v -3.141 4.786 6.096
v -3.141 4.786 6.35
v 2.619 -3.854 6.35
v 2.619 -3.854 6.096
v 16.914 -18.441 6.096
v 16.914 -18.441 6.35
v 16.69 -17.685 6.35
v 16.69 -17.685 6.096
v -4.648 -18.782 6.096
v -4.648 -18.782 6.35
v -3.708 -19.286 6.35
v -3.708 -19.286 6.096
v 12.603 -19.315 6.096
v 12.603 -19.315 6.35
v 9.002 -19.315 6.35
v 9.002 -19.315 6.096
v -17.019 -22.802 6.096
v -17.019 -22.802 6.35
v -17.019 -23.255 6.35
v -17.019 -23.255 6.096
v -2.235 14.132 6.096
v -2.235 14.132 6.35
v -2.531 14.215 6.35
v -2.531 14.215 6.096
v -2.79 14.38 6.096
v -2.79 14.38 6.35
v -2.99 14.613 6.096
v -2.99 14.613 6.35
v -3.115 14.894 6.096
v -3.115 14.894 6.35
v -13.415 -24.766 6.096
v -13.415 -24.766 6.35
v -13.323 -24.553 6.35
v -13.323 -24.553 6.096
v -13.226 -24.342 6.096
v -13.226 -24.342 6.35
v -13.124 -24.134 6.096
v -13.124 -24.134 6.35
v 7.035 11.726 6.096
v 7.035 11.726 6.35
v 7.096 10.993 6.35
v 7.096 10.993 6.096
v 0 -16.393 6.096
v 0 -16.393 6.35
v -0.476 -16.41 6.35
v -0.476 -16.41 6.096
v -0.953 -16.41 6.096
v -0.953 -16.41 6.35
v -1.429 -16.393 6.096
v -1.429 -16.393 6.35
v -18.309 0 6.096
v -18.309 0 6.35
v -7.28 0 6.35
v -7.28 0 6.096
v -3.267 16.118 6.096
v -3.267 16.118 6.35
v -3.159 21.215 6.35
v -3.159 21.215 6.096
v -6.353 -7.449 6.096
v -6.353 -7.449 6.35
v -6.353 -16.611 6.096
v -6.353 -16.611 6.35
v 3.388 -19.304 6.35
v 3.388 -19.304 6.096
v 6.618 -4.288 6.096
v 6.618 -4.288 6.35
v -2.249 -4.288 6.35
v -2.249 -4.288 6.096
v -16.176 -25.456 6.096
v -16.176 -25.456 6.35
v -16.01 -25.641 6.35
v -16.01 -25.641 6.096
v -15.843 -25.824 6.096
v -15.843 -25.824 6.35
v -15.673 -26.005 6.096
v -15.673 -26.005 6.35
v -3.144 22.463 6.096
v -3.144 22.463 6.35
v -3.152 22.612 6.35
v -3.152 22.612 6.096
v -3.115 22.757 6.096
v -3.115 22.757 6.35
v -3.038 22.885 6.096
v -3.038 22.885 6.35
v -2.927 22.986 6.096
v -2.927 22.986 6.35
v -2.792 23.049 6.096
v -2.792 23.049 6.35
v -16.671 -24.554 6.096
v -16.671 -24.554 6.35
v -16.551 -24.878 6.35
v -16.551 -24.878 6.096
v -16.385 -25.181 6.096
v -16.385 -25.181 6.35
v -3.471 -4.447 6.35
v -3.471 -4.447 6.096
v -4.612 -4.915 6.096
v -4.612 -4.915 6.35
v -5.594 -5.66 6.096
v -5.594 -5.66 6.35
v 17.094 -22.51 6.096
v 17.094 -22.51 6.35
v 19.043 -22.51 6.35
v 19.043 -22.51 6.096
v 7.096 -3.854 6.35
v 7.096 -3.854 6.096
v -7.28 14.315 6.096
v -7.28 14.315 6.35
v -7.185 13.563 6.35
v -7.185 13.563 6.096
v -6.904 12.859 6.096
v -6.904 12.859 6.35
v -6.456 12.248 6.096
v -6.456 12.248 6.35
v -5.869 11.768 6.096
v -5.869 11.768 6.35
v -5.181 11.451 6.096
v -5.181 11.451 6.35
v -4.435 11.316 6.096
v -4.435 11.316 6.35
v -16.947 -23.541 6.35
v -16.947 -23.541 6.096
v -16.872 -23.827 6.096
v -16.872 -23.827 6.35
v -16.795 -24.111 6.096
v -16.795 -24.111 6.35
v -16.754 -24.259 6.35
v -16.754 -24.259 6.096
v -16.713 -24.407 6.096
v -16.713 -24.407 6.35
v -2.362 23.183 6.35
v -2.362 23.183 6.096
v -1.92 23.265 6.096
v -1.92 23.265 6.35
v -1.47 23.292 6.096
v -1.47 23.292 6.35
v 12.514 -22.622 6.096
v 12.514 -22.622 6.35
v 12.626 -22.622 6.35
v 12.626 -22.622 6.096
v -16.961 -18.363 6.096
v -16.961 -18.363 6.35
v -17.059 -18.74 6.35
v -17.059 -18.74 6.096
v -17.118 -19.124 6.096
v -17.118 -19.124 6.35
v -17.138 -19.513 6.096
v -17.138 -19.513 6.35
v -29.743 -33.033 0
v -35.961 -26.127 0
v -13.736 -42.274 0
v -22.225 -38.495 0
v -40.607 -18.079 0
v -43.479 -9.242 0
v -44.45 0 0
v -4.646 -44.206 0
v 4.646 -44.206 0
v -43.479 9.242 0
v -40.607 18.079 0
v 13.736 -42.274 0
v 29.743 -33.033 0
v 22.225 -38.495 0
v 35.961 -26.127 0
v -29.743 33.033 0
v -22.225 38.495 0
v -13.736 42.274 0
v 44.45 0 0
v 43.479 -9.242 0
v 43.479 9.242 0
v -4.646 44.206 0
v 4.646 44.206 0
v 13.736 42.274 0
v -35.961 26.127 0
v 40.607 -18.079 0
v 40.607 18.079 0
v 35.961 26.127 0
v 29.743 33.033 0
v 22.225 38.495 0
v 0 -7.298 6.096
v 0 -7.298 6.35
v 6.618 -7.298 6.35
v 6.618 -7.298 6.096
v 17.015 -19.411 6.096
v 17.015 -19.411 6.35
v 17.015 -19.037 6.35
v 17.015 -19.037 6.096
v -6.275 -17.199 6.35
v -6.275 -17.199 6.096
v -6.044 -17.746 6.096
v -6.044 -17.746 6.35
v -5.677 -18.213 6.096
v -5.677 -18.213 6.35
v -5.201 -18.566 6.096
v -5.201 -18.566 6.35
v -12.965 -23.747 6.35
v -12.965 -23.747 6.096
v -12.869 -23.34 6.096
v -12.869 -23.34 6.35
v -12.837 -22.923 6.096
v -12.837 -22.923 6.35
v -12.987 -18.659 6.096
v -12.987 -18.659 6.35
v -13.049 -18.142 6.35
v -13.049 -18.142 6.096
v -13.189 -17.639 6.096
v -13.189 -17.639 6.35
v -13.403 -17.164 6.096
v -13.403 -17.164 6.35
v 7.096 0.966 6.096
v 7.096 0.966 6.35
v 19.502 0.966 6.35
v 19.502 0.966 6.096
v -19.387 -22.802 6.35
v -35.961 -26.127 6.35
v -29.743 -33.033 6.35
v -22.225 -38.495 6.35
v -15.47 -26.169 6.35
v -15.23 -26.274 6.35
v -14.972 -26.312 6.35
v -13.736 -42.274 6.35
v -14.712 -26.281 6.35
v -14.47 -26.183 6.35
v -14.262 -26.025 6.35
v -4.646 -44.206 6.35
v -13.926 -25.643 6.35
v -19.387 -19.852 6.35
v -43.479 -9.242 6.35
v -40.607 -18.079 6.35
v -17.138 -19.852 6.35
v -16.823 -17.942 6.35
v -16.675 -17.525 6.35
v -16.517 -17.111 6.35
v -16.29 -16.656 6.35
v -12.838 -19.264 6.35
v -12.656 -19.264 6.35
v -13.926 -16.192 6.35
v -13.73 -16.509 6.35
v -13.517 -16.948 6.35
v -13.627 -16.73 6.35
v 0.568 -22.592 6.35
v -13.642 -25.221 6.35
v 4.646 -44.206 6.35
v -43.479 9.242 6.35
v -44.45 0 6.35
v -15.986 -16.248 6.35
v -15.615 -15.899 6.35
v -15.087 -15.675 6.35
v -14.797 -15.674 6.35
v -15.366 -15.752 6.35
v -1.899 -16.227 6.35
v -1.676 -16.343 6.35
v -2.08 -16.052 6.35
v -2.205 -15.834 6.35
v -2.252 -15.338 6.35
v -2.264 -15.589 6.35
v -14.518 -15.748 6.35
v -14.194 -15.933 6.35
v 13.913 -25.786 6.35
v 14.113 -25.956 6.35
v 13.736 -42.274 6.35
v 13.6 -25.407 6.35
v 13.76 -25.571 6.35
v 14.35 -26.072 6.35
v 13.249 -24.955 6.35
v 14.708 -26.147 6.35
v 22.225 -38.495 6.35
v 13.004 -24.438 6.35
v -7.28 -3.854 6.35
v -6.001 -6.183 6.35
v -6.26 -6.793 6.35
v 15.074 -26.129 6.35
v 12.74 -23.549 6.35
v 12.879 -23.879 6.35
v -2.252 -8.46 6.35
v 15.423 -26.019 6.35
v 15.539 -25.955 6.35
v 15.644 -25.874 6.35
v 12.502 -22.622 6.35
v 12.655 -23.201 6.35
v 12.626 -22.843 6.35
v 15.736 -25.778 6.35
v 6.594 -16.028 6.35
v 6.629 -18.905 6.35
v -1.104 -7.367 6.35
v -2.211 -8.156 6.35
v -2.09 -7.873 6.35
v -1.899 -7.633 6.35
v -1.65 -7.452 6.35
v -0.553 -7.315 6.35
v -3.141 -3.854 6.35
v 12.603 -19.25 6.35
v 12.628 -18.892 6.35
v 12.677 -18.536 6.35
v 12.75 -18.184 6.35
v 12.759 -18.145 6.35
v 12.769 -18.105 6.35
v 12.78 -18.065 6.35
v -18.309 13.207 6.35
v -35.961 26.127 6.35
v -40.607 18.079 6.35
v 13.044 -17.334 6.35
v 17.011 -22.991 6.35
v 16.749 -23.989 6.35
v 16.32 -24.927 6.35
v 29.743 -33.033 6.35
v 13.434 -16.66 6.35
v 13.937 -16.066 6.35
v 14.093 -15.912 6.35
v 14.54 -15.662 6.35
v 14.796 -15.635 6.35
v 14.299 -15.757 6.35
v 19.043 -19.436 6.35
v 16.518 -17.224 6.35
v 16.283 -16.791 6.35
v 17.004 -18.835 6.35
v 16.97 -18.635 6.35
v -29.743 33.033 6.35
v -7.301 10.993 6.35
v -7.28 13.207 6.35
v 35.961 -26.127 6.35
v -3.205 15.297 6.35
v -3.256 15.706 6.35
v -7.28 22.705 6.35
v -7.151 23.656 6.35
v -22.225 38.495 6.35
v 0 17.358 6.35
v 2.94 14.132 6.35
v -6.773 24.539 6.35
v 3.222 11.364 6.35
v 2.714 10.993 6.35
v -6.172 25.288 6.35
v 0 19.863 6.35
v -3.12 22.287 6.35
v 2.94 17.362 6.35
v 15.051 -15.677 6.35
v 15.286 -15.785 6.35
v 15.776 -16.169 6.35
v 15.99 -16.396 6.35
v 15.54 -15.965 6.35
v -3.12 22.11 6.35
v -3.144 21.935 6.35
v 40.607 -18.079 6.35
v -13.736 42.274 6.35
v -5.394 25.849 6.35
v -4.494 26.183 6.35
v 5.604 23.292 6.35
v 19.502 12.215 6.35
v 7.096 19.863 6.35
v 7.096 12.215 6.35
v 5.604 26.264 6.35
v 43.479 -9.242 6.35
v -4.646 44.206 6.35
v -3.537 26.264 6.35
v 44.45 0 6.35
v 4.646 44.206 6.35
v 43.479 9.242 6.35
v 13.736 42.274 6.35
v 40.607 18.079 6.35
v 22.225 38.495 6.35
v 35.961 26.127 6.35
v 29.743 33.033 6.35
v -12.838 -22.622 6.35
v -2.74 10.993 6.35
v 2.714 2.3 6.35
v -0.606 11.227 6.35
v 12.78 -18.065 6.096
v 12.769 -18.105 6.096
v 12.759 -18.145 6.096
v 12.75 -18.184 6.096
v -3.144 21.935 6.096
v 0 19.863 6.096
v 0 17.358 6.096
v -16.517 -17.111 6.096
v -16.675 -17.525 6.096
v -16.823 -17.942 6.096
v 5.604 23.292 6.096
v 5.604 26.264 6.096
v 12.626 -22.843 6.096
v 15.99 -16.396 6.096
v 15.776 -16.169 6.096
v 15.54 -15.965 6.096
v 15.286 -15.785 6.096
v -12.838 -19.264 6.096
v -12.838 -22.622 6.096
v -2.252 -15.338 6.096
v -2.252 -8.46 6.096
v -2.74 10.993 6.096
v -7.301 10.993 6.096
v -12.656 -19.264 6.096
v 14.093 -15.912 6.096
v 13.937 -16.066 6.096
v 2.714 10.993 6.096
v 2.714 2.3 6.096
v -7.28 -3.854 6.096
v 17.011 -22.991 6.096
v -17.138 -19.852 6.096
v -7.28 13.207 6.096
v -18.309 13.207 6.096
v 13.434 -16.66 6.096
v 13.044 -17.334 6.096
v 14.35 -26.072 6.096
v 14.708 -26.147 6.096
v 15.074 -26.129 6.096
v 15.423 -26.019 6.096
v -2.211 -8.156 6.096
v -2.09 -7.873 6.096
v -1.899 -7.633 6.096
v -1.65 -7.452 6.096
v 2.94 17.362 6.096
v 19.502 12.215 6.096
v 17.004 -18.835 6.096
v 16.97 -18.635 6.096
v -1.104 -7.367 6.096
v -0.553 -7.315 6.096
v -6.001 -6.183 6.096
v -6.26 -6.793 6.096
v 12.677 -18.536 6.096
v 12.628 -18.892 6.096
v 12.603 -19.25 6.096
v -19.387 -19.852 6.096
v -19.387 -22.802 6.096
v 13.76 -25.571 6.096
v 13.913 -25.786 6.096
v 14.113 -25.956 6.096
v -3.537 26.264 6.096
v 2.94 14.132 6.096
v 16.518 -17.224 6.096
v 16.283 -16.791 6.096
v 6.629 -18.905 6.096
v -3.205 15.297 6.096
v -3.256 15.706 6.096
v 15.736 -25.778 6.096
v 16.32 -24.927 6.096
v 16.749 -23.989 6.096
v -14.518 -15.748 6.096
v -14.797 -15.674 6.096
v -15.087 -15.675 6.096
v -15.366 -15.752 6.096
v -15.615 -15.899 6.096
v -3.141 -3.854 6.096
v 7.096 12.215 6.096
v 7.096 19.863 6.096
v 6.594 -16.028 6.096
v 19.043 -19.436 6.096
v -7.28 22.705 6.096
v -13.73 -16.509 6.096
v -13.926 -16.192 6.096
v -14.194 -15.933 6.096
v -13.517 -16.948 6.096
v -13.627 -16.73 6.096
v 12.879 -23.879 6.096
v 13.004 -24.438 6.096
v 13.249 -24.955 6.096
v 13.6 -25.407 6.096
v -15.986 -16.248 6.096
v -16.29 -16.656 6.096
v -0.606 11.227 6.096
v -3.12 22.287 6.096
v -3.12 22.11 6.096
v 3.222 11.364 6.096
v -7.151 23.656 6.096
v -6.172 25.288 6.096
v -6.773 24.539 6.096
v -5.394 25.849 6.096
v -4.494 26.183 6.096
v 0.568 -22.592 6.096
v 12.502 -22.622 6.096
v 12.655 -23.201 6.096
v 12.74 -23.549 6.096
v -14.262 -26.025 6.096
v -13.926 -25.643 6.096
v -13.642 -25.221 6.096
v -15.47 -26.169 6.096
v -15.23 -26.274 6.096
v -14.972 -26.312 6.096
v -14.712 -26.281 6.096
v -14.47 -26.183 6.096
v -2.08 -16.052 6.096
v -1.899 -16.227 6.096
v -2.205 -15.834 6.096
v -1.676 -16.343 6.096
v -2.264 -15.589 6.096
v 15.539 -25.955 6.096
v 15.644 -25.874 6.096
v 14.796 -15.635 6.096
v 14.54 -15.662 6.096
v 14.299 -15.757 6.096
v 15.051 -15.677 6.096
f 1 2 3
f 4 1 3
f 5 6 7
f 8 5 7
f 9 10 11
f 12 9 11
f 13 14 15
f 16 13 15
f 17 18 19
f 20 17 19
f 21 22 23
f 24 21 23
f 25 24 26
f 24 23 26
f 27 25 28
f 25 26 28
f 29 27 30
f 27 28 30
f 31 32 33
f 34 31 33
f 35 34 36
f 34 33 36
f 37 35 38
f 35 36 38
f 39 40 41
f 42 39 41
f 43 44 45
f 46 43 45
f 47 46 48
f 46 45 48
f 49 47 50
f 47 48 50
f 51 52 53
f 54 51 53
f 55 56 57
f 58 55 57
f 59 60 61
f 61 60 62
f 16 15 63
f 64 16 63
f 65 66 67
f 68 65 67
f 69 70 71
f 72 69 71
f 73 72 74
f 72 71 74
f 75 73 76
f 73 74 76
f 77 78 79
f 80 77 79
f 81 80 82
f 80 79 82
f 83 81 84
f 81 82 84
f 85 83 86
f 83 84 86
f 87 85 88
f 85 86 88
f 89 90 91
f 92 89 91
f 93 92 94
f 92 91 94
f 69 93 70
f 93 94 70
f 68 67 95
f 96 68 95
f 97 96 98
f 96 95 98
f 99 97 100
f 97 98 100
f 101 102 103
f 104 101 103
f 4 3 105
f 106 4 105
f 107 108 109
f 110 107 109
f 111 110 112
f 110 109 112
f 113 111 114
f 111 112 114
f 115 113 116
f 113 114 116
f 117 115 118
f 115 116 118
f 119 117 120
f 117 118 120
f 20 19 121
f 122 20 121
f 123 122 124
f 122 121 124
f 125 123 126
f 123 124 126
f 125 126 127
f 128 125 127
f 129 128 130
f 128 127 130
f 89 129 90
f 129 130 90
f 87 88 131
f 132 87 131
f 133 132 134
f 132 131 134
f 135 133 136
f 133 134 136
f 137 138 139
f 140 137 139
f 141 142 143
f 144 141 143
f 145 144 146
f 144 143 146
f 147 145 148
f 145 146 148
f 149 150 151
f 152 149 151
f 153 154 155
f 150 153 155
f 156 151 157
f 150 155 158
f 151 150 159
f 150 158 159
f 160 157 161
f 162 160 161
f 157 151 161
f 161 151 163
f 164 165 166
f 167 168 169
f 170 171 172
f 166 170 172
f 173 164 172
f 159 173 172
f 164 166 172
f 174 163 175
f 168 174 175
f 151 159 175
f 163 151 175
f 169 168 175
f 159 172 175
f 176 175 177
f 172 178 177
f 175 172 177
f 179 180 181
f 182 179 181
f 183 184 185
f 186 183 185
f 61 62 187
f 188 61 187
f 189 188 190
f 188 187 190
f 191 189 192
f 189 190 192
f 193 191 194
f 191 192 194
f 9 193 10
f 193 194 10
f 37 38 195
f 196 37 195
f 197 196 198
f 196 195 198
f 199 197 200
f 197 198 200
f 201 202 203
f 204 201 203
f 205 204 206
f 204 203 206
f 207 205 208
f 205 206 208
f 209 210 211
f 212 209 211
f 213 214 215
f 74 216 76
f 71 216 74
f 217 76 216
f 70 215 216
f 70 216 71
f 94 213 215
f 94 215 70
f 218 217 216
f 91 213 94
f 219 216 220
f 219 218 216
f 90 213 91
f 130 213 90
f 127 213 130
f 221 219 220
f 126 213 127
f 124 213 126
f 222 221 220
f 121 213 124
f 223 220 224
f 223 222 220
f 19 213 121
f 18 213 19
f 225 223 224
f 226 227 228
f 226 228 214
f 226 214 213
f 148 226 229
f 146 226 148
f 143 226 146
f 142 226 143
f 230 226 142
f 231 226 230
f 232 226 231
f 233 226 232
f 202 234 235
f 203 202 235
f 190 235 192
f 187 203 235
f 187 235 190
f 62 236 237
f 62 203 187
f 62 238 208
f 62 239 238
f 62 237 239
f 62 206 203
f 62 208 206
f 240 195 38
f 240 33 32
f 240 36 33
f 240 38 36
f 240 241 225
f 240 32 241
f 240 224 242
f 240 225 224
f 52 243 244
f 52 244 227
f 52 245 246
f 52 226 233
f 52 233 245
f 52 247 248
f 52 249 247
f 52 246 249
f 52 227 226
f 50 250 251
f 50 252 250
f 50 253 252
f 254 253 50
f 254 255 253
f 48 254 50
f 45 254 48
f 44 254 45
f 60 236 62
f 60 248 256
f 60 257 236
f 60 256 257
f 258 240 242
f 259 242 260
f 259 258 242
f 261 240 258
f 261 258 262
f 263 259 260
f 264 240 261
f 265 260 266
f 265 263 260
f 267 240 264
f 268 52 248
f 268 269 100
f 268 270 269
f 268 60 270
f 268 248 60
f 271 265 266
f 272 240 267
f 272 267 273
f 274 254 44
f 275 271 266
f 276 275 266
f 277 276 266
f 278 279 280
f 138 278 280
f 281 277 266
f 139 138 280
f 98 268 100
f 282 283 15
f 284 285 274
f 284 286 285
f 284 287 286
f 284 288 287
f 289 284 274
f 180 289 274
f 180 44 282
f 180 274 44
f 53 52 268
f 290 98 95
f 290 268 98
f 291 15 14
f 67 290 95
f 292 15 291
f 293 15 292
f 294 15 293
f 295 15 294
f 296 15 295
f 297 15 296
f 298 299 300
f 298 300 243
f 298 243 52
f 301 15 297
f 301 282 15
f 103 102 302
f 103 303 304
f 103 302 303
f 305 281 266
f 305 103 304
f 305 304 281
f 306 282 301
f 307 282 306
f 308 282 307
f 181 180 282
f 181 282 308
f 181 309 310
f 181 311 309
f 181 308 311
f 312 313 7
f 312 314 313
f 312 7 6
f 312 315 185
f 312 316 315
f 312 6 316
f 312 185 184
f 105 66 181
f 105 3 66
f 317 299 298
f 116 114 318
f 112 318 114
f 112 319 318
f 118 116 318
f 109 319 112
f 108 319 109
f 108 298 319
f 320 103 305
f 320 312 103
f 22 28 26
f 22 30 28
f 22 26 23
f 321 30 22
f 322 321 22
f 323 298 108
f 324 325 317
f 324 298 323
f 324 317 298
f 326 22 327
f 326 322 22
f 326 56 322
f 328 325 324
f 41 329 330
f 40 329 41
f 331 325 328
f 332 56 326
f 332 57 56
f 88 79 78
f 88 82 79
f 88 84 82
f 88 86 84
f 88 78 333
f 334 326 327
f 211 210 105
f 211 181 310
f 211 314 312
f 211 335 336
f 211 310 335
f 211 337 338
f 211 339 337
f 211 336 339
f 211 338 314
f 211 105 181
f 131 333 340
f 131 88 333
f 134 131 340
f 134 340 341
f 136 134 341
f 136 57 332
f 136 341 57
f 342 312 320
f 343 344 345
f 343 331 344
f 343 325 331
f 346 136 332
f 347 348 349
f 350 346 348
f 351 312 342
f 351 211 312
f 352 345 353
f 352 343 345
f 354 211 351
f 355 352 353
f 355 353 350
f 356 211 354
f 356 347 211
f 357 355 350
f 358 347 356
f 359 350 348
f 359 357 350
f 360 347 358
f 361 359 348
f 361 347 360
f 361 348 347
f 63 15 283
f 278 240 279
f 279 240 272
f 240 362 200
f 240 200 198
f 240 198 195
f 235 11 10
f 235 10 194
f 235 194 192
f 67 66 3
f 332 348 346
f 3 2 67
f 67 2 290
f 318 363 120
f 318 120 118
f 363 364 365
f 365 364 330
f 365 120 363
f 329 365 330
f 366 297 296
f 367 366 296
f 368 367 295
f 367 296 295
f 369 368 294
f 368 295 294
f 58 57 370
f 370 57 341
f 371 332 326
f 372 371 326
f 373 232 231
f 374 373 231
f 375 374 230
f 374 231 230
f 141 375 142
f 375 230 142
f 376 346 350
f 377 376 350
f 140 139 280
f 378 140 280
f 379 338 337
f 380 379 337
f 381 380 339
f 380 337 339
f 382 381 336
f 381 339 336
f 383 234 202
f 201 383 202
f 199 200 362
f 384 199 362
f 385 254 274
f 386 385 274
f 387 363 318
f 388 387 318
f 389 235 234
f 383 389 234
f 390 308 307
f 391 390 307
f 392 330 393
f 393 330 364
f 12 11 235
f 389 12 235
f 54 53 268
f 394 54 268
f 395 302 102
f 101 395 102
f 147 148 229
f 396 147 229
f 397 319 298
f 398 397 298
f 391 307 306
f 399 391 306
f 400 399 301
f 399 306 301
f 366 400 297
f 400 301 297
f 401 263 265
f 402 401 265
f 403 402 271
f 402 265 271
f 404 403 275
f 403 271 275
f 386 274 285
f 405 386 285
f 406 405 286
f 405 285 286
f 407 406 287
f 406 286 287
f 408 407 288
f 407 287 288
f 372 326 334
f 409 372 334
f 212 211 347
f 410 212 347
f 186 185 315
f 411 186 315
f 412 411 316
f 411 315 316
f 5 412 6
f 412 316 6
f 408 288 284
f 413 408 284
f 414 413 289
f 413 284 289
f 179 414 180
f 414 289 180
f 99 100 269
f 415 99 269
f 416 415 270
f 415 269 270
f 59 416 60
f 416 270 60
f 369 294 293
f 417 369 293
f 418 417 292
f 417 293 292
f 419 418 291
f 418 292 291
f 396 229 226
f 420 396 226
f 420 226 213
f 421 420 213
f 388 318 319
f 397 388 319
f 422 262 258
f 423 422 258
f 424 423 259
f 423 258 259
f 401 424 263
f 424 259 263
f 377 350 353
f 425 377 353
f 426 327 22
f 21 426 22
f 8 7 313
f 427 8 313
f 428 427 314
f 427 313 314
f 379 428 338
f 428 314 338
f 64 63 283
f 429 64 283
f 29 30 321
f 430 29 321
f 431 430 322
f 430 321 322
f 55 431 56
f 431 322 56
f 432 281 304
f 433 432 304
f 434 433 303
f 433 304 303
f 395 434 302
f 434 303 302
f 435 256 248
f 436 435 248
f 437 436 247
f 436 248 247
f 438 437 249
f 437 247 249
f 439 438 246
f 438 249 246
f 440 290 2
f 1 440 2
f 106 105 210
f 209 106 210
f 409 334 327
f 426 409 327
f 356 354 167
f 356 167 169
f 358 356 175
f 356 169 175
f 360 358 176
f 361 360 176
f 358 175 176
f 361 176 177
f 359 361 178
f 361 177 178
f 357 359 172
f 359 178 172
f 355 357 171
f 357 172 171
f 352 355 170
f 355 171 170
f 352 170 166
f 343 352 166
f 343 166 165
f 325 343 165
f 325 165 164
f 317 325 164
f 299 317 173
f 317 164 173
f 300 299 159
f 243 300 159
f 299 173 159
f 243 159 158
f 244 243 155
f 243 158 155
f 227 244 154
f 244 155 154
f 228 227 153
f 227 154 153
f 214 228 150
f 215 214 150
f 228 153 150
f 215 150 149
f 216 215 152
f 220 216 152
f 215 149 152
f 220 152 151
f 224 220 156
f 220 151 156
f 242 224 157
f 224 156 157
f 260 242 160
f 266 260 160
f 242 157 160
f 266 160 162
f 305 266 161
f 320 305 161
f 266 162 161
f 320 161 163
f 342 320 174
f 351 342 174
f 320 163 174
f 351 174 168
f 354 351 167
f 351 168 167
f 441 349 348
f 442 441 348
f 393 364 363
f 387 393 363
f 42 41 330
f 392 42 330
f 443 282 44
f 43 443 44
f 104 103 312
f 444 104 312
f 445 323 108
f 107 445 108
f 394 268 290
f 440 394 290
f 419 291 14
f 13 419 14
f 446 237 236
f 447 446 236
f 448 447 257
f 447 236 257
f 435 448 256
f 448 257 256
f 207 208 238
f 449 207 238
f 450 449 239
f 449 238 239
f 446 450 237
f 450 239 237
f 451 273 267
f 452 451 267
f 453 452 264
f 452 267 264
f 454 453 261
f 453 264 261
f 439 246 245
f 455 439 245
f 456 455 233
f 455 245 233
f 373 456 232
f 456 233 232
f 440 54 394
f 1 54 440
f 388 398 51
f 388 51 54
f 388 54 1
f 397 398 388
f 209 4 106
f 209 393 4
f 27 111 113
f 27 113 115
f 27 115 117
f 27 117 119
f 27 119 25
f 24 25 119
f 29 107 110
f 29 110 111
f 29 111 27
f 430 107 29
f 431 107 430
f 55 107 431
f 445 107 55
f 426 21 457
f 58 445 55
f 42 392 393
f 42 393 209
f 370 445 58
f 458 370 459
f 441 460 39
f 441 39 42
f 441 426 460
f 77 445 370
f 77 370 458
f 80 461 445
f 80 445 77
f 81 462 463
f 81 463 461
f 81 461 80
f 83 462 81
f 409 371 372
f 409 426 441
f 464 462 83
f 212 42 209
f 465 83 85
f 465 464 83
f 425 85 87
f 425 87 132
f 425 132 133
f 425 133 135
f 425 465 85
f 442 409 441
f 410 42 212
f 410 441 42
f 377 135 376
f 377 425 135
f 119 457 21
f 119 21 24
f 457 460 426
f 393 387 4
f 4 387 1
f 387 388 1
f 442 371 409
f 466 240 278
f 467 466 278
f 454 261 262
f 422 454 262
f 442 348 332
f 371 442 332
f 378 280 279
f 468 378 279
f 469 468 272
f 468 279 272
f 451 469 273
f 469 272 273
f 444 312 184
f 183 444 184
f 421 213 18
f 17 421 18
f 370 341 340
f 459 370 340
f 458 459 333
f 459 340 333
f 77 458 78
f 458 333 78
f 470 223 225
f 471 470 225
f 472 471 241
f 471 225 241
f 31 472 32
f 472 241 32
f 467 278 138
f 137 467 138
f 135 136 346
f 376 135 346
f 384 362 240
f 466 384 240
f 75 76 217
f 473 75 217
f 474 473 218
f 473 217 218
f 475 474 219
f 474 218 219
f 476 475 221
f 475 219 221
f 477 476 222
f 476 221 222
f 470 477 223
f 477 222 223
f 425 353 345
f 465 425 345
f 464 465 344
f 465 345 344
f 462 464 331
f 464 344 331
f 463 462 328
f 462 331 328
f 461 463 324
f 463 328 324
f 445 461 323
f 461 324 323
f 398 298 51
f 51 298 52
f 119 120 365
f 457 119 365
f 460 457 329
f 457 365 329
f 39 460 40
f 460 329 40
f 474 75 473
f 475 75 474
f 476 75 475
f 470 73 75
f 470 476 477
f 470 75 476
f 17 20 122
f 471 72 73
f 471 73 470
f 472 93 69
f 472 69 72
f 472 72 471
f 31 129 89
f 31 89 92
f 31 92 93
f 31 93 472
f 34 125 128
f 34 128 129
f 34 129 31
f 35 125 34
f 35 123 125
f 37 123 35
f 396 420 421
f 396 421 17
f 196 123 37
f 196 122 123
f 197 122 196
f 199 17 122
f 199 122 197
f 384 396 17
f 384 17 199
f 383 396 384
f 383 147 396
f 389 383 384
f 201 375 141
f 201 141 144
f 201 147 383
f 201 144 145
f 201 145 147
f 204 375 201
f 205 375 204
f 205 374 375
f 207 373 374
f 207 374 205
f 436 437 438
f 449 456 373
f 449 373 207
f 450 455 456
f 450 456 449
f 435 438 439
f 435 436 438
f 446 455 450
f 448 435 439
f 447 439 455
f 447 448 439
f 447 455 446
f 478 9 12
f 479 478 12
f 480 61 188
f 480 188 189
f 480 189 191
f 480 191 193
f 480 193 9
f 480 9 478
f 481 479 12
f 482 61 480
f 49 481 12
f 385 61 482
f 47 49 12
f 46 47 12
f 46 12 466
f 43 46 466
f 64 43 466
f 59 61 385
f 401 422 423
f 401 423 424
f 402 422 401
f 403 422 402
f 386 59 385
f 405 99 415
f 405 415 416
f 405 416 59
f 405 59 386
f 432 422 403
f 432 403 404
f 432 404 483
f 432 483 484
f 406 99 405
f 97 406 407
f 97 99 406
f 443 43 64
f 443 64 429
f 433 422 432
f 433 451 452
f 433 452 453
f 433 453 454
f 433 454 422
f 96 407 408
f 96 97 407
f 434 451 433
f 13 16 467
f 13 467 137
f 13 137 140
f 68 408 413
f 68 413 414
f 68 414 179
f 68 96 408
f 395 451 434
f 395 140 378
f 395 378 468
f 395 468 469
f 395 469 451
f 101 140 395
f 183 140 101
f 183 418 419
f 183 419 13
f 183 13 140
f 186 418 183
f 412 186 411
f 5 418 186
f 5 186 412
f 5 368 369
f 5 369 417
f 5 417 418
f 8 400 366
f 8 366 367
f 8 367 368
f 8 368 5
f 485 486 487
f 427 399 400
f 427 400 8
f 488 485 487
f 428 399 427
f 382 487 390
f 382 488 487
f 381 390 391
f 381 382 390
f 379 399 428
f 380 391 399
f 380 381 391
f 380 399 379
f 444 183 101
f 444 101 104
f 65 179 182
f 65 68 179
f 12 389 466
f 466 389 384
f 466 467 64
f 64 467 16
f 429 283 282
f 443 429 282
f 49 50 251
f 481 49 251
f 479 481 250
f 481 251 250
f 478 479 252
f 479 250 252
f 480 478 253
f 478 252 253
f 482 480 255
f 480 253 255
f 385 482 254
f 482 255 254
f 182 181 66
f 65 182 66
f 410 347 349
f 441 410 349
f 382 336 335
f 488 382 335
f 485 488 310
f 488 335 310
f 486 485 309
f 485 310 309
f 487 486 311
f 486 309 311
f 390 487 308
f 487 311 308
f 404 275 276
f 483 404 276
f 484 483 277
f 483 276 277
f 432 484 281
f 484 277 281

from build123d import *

# Parameters (mm, degrees)
F0_R     = 44.45
F1_DEPTH = 6.35
F3_DEPTH = 0.254


# Not quite as in the source:
# - ends of sketch curves that miss each other by under 0.0002 mm in the source are joined


with BuildPart() as f1:
    # F0 (on Top) → F1 (new body)
    with BuildSketch(Plane.XY):
        Circle(F0_R)
    extrude(amount=F1_DEPTH)

    # F2 (on face) → F3 (cut)
    with BuildSketch(Plane.XY.offset(6.35)):
        with BuildLine():
            Line((5.6039993651, 23.2917912652), (5.6039993651, 26.2641511811))
            Line((5.6039993651, 26.2641511811), (-3.5374157604, 26.2641511811))
            ThreePointArc((-3.5374157604, 26.2641511811), (-6.1724008767, 25.2877017598), (-7.2804156008, 22.7052797559))
            Line((-7.2804156008, 22.7052797559), (-7.2804156008, 14.3152289093))
            ThreePointArc((-7.2804156008, 14.3152289093), (-6.4557803762, 12.2478717336), (-4.4346582144, 11.3156409934))
            ThreePointArc((-4.4346582144, 11.3156409934), (1.3092272973, 11.2673019991), (7.0349466987, 11.7263169959))
            Line((7.0349466987, 11.7263169959), (7.0961336605, 12.2146336362))
            Line((7.0961336605, 12.2146336362), (7.0961336605, 19.8627323627))
            Line((7.0961336605, 19.8627323627), (0, 19.8627323627))
            Line((0, 19.8627323627), (0, 17.358450219))
            Line((0, 17.358450219), (2.9400843196, 17.3616167158))
            Line((2.9400843196, 17.3616167158), (2.9400843196, 14.1317071393))
            Line((2.9400843196, 14.1317071393), (0, 14.1317071393))
            Line((0, 14.1317071393), (-2.2346060723, 14.1317071393))
            ThreePointArc((-2.2346060723, 14.1317071393), (-2.7898678793, 14.3800667532), (-3.1146267429, 14.8943914101))
            ThreePointArc((-3.1146267429, 14.8943914101), (-3.2355914853, 15.5005322545), (-3.2674165577, 16.1178055789))
            Line((-3.2674165577, 16.1178055789), (-3.1592417437, 21.2145812126))
            ThreePointArc((-3.1592417437, 21.2145812126), (-3.1837866635, 21.575252567), (-3.1439608429, 21.9345577061))
            ThreePointArc((-3.1439608429, 21.9345577061), (-3.117530452, 22.198564373), (-3.1439608429, 22.4625710398))
            ThreePointArc((-3.1439608429, 22.4625710398), (-3.0817290753, 22.8241742068), (-2.7919525746, 23.0492502451))
            ThreePointArc((-2.7919525746, 23.0492502451), (-2.1422008965, 23.2306538656), (-1.4703774561, 23.2917912652))
            Line((-1.4703774561, 23.2917912652), (5.6039993651, 23.2917912652))
        make_face()
        with BuildLine():
            Line((-3.1592417437, 21.2145812126), (-3.1439608429, 21.9345577061))
            ThreePointArc((-3.1439608429, 21.9345577061), (-3.1837866635, 21.575252567), (-3.1592417437, 21.2145812126))
        make_face()
        Polygon((7.0961336605, 12.2146336362), (7.0349466987, 11.7263169959), (7.0961336605, 10.9925279394), (7.0961336605, 0.9659290663), (19.5016358048, 0.9659290663), (19.5016358048, 12.2146336362), align=None)
        Polygon((7.0961336605, 0.9659290663), (7.0961336605, 10.9925279394), (2.7143813204, 10.9925279394), (2.7143813204, 2.2997791572), (-2.7398910557, 10.9925279394), (-7.300500758, 10.9925279394), (-7.2804156008, 0), (-7.2804156008, -3.8537723012), (-6.2781353481, -3.8537723012), (-3.1410043308, -3.8537723012), (-3.1410043308, 4.7863919603), (2.6191033489, -3.8537723012), (7.0961336605, -3.8537723012), align=None)
        Polygon((-7.2804156008, 0), (-7.300500758, 10.9925279394), (-7.2804156008, 13.206558302), (-18.3086954057, 13.206558302), (-18.3086954057, 0), align=None)
        with BuildLine():
            Line((0, -7.2983574902), (6.6179535352, -7.2983574902))
            Line((6.6179535352, -7.2983574902), (6.6179535352, -4.2878086955))
            Line((6.6179535352, -4.2878086955), (-2.2489061664, -4.2878086955))
            ThreePointArc((-2.2489061664, -4.2878086955), (-4.0568875501, -4.6442817118), (-5.5942512015, -5.6603440615))
            ThreePointArc((-5.5942512015, -5.6603440615), (-6.1507192567, -6.4794007942), (-6.3533238135, -7.4486592847))
            Line((-6.3533238135, -7.4486592847), (-6.3533238135, -16.6105034737))
            ThreePointArc((-6.3533238135, -16.6105034737), (-5.8759308245, -17.9913268961), (-4.6476325952, -18.782440573))
            Line((-4.6476325952, -18.782440573), (-3.7075637703, -19.2863568686))
            Line((-3.7075637703, -19.2863568686), (3.3881619917, -19.303988614))
            Line((3.3881619917, -19.303988614), (6.6293859856, -18.9052186906))
            Line((6.6293859856, -18.9052186906), (6.593650474, -16.0276701207))
            Line((6.593650474, -16.0276701207), (0, -16.3928680122))
            ThreePointArc((0, -16.3928680122), (-0.7145080017, -16.4126398372), (-1.4290160034, -16.3928680122))
            ThreePointArc((-1.4290160034, -16.3928680122), (-2.080113152, -16.0523673946), (-2.251843689, -15.3379607946))
            Line((-2.251843689, -15.3379607946), (-2.251843689, -8.4599647671))
            ThreePointArc((-2.251843689, -8.4599647671), (-2.0899663646, -7.8730095416), (-1.6501033679, -7.4520092458))
            ThreePointArc((-1.6501033679, -7.4520092458), (-0.8286208401, -7.3368533365), (0, -7.2983574902))
        make_face()
        with BuildLine():
            Line((3.3881619917, -19.303988614), (-3.7075637703, -19.2863568686))
            Line((-3.7075637703, -19.2863568686), (-12.6563319936, -19.2641206086))
            Line((-12.6563319936, -19.2641206086), (-12.8377182409, -19.2641206086))
            Line((-12.8377182409, -19.2641206086), (-12.9873463884, -18.6591409147))
            ThreePointArc((-12.9873463884, -18.6591409147), (-13.1098010784, -17.8878071535), (-13.4031539783, -17.1640012413))
            ThreePointArc((-13.4031539783, -17.1640012413), (-13.5725884432, -16.8395453931), (-13.7304924428, -16.5093243122))
            ThreePointArc((-13.7304924428, -16.5093243122), (-14.0521811274, -16.0543913958), (-14.5178735256, -15.7484859228))
            ThreePointArc((-14.5178735256, -15.7484859228), (-15.086809482, -15.6747136098), (-15.6148988754, -15.8988833427))
            ThreePointArc((-15.6148988754, -15.8988833427), (-16.1466107031, -16.4449553577), (-16.5172908455, -17.1109195799))
            ThreePointArc((-16.5172908455, -17.1109195799), (-16.7501696159, -17.7330376736), (-16.9609729201, -18.3629784733))
            ThreePointArc((-16.9609729201, -18.3629784733), (-17.0934179213, -18.9312665088), (-17.1379111707, -19.5130854845))
            Line((-17.1379111707, -19.5130854845), (-17.1379111707, -19.8522191495))
            Line((-17.1379111707, -19.8522191495), (-19.3871874362, -19.8522191495))
            Line((-19.3871874362, -19.8522191495), (-19.3871874362, -22.8021256626))
            Line((-19.3871874362, -22.8021256626), (-17.0194374538, -22.8021256626))
            Line((-17.0194374538, -22.8021256626), (-17.0194374538, -23.2551640704))
            ThreePointArc((-17.0194374538, -23.2551640704), (-16.9093551317, -23.6838787474), (-16.7950224131, -24.1114795208))
            ThreePointArc((-16.7950224131, -24.1114795208), (-16.7338426372, -24.3328635786), (-16.6711639613, -24.5538279414))
            ThreePointArc((-16.6711639613, -24.5538279414), (-16.4738073507, -25.0326716474), (-16.1757338792, -25.4562199116))
            ThreePointArc((-16.1757338792, -25.4562199116), (-15.9267297619, -25.732701627), (-15.6729177634, -26.0047763574))
            ThreePointArc((-15.6729177634, -26.0047763574), (-14.9718242273, -26.3117655956), (-14.2623546636, -26.0246637372))
            ThreePointArc((-14.2623546636, -26.0246637372), (-13.7772653209, -25.4368959002), (-13.4154763073, -24.7661564499))
            ThreePointArc((-13.4154763073, -24.7661564499), (-13.2751868701, -24.4473909933), (-13.1237693131, -24.1337586194))
            ThreePointArc((-13.1237693131, -24.1337586194), (-12.9090296801, -23.5454392253), (-12.837051295, -22.9233042467))
            Line((-12.837051295, -22.9233042467), (-12.8377182409, -22.622095421))
            Line((-12.8377182409, -22.622095421), (0.5678676759, -22.592412358))
            Line((0.5678676759, -22.592412358), (12.5019904939, -22.6220667474))
            Line((12.5019904939, -22.6220667474), (12.5135298725, -22.622095421))
            Line((12.5135298725, -22.622095421), (12.6259239413, -22.622095421))
            Line((12.6259239413, -22.622095421), (12.6259239413, -22.8433404118))
            ThreePointArc((12.6259239413, -22.8433404118), (12.6900931034, -23.3765945805), (12.878936831, -23.8794024329))
            ThreePointArc((12.878936831, -23.8794024329), (13.1121897024, -24.7032143779), (13.6001783309, -25.4067341867))
            Line((13.6001783309, -25.4067341867), (13.7601625174, -25.5711600184))
            ThreePointArc((13.7601625174, -25.5711600184), (14.0077931702, -25.8774350672), (14.3499616533, -26.0724890977))
            ThreePointArc((14.3499616533, -26.0724890977), (14.8915415981, -26.1493664388), (15.4228175364, -26.0191172952))
            ThreePointArc((15.4228175364, -26.0191172952), (15.5930961418, -25.9161088082), (15.7359875739, -25.7775895298))
            ThreePointArc((15.7359875739, -25.7775895298), (16.5550328697, -24.4671777543), (17.0114282519, -22.9907911271))
            Line((17.0114282519, -22.9907911271), (17.0942133791, -22.5096959621))
            Line((17.0942133791, -22.5096959621), (19.0433021635, -22.5096959621))
            Line((19.0433021635, -22.5096959621), (19.0433021635, -19.4356404245))
            Line((19.0433021635, -19.4356404245), (17.0150939375, -19.4110530503))
            Line((17.0150939375, -19.4110530503), (17.0150939375, -19.0368138024))
            ThreePointArc((17.0150939375, -19.0368138024), (16.989674065, -18.7347053505), (16.9141292572, -18.4410922229))
            Line((16.9141292572, -18.4410922229), (16.690004617, -17.6846757531))
            ThreePointArc((16.690004617, -17.6846757531), (16.407642716, -17.0034564681), (15.9896202385, -16.3959655911))
            ThreePointArc((15.9896202385, -16.3959655911), (15.6603689447, -16.0642729564), (15.2857392253, -15.7848467735))
            ThreePointArc((15.2857392253, -15.7848467735), (14.6670179234, -15.6398096454), (14.0927875351, -15.9120435136))
            Line((14.0927875351, -15.9120435136), (13.9366754533, -16.0662262266))
            ThreePointArc((13.9366754533, -16.0662262266), (13.2239743808, -16.988100564), (12.7797400013, -18.0653428434))
            ThreePointArc((12.7797400013, -18.0653428434), (12.7644443964, -18.1246889663), (12.7497899169, -18.1841966471))
            ThreePointArc((12.7497899169, -18.1841966471), (12.6499744154, -18.7132948986), (12.6030528918, -19.2496776581))
            Line((12.6030528918, -19.2496776581), (12.6030528918, -19.3145554513))
            Line((12.6030528918, -19.3145554513), (9.0023325756, -19.3145554513))
            Line((9.0023325756, -19.3145554513), (3.3881619917, -19.303988614))
        make_face()
    extrude(amount=-F3_DEPTH, mode=Mode.SUBTRACT)


solid = f1.part
